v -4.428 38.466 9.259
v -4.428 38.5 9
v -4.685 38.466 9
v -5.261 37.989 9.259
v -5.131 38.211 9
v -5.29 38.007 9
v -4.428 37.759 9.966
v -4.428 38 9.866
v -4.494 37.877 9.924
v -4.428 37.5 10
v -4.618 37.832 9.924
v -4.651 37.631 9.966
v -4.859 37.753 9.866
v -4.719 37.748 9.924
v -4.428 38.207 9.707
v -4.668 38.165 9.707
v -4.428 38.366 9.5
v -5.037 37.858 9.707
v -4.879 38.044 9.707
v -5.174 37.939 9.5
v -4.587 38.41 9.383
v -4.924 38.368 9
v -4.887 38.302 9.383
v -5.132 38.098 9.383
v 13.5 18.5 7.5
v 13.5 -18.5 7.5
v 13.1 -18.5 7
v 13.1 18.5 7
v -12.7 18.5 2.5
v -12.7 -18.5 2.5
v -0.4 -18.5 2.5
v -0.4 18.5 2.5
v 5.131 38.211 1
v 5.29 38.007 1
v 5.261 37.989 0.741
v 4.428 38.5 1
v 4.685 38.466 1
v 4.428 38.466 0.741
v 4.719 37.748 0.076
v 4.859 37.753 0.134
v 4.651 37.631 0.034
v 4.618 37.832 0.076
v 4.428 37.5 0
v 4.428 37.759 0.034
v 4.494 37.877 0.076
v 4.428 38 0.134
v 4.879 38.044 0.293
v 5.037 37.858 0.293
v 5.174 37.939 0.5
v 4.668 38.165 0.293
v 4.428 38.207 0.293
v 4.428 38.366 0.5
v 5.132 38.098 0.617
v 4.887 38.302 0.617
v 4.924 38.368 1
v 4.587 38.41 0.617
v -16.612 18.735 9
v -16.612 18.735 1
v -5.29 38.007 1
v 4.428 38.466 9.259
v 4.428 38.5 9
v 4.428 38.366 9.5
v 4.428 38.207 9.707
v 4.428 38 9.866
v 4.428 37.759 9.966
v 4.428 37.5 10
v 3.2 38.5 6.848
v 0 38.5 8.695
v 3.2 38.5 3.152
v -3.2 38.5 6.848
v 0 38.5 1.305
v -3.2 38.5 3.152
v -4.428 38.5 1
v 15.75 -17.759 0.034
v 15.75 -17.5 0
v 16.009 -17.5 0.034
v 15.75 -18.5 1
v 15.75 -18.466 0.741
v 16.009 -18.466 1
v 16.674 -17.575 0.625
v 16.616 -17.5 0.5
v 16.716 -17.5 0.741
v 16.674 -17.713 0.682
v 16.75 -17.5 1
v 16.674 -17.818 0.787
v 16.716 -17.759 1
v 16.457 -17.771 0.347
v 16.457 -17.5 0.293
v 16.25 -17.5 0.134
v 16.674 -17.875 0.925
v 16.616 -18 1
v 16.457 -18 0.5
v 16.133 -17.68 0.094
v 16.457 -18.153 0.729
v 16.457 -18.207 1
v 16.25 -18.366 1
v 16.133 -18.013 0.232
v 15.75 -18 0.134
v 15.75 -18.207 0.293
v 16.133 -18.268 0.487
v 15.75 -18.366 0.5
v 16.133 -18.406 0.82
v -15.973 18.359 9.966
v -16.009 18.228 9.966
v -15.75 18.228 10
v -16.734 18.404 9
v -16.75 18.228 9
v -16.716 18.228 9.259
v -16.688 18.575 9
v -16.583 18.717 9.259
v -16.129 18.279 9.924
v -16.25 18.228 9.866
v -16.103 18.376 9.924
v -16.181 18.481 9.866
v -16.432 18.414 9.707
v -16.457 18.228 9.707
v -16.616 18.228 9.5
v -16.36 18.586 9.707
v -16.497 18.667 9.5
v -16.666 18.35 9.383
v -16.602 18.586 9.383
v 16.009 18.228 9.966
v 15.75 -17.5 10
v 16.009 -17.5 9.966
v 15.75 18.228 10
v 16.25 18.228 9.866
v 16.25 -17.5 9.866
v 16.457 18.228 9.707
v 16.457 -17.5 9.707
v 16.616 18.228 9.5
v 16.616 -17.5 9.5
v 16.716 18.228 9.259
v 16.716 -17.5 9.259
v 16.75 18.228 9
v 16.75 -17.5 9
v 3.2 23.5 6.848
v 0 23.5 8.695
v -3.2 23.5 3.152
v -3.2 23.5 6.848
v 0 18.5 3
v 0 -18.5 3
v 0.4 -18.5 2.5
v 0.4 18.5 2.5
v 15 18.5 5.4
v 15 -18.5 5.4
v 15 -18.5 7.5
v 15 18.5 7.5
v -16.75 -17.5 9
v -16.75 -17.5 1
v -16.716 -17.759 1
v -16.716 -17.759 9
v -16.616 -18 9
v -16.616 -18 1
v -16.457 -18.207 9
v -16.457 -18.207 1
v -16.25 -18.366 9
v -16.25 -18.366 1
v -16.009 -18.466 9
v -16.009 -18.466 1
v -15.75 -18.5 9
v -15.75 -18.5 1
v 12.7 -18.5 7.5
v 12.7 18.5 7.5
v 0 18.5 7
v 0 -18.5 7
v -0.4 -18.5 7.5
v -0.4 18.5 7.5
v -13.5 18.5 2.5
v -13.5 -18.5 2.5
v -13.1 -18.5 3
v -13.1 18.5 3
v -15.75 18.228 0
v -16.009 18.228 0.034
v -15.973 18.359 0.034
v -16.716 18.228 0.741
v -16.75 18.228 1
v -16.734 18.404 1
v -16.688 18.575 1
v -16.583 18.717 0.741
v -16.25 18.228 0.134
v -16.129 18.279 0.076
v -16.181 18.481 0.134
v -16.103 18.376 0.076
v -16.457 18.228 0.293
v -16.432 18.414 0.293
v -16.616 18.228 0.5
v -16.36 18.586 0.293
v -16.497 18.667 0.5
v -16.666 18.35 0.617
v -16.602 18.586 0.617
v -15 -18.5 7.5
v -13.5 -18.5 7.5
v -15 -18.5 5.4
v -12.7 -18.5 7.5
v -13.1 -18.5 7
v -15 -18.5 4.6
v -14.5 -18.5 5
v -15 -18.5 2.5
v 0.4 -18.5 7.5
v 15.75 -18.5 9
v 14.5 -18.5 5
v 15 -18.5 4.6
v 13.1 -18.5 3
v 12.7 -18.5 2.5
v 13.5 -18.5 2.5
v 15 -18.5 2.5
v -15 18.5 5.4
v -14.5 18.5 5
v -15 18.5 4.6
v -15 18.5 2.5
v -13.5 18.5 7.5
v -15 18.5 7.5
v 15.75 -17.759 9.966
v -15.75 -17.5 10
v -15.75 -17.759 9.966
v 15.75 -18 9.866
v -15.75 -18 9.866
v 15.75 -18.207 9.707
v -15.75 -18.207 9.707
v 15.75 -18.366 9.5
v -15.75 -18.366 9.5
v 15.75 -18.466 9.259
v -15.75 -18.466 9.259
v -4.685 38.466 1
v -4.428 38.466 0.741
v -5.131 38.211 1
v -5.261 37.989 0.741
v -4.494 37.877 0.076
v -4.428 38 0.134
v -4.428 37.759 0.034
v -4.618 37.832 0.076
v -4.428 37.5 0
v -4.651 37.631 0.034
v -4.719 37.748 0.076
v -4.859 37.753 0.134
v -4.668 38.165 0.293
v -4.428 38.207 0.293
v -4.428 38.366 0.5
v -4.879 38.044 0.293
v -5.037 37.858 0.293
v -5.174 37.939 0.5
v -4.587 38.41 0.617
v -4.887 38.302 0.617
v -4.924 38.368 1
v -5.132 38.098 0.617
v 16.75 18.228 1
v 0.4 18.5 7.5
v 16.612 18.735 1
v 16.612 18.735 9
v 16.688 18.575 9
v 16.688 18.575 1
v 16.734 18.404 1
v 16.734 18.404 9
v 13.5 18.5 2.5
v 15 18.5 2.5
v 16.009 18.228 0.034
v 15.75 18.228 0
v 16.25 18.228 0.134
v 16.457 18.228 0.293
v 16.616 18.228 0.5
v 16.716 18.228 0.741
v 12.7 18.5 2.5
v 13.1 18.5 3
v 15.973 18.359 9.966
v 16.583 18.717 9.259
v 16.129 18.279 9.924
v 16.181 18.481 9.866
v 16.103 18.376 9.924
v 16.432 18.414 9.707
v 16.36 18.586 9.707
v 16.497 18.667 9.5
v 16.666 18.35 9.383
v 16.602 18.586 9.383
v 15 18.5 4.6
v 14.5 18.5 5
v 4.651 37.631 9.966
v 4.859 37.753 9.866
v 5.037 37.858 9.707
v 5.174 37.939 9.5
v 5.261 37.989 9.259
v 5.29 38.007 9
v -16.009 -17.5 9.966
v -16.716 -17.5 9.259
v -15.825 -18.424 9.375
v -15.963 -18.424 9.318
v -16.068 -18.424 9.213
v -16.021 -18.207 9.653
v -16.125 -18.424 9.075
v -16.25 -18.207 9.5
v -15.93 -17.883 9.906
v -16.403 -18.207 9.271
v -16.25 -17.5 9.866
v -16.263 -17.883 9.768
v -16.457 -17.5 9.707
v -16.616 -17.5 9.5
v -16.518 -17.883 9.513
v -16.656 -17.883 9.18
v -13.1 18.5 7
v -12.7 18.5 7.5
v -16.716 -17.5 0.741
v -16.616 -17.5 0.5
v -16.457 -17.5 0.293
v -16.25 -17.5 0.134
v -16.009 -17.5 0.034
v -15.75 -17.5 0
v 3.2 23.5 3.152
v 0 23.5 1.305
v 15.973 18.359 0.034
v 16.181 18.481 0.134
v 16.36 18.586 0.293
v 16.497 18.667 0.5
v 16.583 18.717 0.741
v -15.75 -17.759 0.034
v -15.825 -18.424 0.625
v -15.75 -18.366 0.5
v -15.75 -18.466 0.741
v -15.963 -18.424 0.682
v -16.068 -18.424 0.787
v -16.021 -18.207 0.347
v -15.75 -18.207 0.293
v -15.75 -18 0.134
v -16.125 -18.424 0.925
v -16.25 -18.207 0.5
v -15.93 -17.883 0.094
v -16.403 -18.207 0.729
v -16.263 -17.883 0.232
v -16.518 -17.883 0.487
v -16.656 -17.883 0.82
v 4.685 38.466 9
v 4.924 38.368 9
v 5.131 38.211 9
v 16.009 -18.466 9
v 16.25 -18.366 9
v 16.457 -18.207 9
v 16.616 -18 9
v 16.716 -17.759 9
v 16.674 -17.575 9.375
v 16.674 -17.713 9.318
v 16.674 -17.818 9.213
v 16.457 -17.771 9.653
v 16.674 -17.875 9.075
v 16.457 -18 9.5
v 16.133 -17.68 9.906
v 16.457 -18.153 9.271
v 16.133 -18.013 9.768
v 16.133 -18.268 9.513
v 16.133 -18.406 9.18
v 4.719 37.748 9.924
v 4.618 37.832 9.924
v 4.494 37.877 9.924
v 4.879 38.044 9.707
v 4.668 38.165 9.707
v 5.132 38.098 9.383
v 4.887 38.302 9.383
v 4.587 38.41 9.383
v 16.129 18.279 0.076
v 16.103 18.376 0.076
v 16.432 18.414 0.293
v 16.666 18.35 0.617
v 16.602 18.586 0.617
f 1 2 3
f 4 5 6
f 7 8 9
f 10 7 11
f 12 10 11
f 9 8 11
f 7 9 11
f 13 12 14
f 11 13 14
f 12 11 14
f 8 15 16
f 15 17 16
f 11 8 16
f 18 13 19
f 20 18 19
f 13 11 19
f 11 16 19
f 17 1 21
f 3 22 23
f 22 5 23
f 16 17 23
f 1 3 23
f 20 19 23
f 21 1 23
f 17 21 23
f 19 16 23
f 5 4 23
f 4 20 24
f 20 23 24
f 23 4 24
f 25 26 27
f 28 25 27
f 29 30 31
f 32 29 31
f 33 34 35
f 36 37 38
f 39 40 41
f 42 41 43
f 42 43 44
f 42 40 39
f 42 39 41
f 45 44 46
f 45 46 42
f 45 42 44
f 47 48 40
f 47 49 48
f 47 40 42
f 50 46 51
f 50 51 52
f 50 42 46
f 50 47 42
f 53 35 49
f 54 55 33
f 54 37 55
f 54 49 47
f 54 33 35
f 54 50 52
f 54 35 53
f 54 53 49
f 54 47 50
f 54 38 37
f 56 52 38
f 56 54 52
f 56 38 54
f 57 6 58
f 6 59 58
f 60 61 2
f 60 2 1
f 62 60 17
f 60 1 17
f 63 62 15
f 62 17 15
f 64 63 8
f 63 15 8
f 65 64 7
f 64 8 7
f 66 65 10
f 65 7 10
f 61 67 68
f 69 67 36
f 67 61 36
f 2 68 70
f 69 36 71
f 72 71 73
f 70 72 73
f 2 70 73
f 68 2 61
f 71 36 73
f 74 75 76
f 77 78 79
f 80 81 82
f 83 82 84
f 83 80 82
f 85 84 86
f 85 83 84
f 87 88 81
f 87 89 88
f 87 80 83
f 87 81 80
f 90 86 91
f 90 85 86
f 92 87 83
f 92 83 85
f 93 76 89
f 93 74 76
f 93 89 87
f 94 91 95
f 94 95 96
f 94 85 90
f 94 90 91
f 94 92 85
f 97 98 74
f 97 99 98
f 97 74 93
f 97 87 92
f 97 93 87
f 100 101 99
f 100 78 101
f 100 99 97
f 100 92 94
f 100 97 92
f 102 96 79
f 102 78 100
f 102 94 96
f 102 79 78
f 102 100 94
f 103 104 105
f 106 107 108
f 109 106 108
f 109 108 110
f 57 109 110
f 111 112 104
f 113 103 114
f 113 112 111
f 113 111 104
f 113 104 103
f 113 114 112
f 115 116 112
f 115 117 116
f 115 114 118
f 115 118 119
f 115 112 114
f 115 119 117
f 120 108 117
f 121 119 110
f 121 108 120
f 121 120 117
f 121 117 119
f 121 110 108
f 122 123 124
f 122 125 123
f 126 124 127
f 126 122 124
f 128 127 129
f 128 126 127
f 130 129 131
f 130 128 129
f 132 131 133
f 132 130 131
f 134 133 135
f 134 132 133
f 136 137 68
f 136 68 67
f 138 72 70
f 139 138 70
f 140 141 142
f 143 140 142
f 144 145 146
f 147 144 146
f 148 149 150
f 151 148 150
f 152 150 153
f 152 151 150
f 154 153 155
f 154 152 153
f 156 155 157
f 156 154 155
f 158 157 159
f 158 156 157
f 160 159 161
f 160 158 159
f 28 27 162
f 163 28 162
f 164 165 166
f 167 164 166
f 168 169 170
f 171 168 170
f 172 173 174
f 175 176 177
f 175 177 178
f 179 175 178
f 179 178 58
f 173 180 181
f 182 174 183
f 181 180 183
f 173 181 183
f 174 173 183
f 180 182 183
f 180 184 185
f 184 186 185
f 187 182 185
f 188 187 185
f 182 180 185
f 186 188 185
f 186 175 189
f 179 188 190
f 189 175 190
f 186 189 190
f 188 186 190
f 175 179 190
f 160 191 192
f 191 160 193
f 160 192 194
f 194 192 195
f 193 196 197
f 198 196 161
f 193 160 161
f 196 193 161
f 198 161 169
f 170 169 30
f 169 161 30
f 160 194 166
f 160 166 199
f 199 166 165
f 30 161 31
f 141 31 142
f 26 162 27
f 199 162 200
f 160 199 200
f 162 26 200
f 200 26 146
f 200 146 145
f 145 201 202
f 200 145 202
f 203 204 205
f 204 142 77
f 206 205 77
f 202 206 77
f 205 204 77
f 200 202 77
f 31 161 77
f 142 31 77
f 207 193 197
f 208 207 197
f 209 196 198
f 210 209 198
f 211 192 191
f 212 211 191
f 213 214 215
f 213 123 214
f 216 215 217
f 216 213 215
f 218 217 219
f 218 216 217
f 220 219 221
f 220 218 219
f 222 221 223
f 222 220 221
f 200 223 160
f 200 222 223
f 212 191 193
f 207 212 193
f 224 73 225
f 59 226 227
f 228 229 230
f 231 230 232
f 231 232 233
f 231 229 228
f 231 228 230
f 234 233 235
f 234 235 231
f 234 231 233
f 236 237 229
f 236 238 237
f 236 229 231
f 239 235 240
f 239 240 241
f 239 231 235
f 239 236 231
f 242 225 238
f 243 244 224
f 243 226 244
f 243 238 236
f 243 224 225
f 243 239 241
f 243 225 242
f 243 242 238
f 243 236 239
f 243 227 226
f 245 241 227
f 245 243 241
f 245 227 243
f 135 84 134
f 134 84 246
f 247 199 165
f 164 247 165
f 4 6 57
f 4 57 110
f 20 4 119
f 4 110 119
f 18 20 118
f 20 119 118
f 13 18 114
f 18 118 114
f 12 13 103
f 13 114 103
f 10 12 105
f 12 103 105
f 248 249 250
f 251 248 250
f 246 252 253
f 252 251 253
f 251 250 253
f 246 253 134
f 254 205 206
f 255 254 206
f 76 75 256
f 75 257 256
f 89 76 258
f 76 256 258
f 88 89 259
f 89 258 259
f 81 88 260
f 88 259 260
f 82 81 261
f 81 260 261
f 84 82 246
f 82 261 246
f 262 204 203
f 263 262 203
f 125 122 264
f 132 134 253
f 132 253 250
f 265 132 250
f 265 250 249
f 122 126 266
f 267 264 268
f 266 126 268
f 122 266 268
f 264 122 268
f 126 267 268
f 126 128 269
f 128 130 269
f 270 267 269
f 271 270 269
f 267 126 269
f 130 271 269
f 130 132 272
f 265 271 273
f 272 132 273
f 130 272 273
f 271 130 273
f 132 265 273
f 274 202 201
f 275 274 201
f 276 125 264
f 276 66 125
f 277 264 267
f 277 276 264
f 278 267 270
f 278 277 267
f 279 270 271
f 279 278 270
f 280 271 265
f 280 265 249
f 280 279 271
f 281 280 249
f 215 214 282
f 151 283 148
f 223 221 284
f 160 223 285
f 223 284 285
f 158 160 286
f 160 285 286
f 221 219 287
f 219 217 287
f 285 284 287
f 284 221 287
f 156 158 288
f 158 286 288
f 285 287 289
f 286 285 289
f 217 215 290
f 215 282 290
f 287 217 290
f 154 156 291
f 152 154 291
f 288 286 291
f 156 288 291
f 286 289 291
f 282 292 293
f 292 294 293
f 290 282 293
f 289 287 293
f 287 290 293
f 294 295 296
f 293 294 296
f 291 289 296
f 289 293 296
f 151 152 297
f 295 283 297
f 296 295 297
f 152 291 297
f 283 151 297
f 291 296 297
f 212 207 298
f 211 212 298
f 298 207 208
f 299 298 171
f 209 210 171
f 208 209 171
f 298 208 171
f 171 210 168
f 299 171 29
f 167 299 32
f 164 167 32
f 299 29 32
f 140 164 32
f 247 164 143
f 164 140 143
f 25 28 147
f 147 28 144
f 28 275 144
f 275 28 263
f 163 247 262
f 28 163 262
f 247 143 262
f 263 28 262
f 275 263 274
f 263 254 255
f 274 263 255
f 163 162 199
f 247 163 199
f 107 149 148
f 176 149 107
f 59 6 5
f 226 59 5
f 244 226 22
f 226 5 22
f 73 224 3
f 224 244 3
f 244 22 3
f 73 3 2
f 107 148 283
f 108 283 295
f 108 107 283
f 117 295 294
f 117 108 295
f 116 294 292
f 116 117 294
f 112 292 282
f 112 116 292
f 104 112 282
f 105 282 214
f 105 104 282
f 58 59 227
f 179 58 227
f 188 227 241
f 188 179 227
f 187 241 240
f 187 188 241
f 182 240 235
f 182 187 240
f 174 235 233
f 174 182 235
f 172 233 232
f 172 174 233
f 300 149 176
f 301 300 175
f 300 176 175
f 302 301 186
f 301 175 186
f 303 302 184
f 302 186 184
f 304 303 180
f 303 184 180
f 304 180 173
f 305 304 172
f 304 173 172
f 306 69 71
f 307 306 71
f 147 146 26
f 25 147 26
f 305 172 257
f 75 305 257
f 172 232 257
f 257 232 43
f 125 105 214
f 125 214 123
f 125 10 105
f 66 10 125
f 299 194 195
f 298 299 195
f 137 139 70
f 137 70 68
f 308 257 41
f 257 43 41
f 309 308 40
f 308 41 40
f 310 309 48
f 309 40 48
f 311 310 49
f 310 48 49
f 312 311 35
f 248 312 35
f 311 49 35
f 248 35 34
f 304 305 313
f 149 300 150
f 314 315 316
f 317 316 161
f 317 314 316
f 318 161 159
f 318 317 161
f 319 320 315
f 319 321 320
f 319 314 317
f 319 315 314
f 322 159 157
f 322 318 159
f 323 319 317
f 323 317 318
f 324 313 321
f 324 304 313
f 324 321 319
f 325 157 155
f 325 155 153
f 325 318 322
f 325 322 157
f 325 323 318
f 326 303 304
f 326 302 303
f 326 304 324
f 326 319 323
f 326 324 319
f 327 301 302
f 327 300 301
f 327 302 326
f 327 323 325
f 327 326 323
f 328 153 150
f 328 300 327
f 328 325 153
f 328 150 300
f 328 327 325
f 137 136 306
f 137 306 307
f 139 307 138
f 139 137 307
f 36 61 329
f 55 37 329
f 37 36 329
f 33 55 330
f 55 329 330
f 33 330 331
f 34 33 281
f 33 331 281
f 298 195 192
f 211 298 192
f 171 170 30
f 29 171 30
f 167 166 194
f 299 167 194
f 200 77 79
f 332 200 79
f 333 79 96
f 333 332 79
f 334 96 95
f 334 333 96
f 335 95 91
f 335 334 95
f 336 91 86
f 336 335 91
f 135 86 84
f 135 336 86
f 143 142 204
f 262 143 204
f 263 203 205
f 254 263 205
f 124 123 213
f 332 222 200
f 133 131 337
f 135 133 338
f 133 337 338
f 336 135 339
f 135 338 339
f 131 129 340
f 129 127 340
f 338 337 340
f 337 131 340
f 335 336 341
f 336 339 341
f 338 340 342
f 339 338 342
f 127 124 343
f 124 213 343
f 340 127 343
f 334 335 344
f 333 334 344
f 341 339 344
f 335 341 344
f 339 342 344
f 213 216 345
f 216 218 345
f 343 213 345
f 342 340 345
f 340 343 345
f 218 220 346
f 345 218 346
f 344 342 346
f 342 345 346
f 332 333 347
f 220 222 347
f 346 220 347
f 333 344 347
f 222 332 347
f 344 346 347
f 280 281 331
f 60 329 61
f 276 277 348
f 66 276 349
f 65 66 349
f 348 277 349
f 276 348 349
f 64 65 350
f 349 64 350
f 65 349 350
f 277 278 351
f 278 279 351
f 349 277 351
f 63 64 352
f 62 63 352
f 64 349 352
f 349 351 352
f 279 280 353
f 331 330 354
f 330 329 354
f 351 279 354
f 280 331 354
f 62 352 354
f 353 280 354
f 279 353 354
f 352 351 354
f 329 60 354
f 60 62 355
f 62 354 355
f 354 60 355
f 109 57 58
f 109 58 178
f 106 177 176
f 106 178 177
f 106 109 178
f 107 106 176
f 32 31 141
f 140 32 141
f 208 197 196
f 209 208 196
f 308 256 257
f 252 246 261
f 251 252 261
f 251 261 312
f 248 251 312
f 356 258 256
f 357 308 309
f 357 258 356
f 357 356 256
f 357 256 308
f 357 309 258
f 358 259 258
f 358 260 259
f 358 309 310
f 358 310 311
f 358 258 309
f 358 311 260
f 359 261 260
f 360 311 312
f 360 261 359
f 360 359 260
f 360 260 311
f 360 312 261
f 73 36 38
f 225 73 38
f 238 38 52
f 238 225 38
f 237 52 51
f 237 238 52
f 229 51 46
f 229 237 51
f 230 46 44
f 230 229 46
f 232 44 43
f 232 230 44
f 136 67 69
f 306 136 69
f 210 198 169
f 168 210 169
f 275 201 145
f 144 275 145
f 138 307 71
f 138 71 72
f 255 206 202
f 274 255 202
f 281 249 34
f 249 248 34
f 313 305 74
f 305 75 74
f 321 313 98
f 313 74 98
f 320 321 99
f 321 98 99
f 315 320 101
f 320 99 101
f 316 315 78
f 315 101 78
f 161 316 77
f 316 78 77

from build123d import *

# Parameters (mm, degrees)
F0_W     = 33.5
F0_H     = 37
F1_DEPTH = 10
F3_DEPTH = 37
F4_DEPTH = 10
F6_DEPTH = 15
F7_R     = 1


with BuildPart() as f1:
    # F0 (on Top) → F1 (new body)
    with BuildSketch(Plane.XY):
        Rectangle(F0_W, F0_H)
    extrude(amount=F1_DEPTH)

    # F2 (on face) → F3 (cut, through all)
    with BuildSketch(Plane.XZ.offset(18.5)):
        Polygon((-13.5, 7.5), (-15, 7.5), (-15, 5.4), (-14.5, 5), (-15, 4.6), (-15, 2.5), (-13.5, 2.5), (-13.1, 3), (-12.7, 2.5), (-1.9, 2.5), (-0.4, 2.5), (0, 3), (0.4, 2.5), (11.2, 2.5), (12.7, 2.5), (13.1, 3), (13.5, 2.5), (15, 2.5), (15, 4.6), (14.5, 5), (15, 5.4), (15, 7.5), (13.5, 7.5), (13.1, 7), (12.7, 7.5), (0.4, 7.5), (0, 7), (-0.4, 7.5), (-12.7, 7.5), (-13.1, 7), align=None)
    extrude(amount=-F3_DEPTH, mode=Mode.SUBTRACT)

    # F0 (on Top) → F4 (join)
    with BuildSketch(Plane.XY):
        Polygon((-5, 38.5), (-16.75, 18.5), (16.75, 18.5), (5, 38.5), align=None)
    extrude(amount=F4_DEPTH)

    # F5 (on face) → F6 (cut)
    with BuildSketch(Plane(origin=(0, 38.5, 0), x_dir=(-1, 0, 0), z_dir=(0, 1, 0))):
        Polygon((-3.2, 6.8475208614), (-3.2, 3.1524791386), (0, 1.3049582772), (3.2, 3.1524791386), (3.2, 6.8475208614), (0, 8.6950417228), align=None)
    extrude(amount=-F6_DEPTH, mode=Mode.SUBTRACT)

    # F7
    f7_edges = [f1.edges().sort_by_distance(p)[0] for p in [
        (-16.75, 0, 10),
        (0, -18.5, 10),
        (16.75, 0, 10),
        (10.875, 28.5, 10),
        (0, 38.5, 10),
        (-10.875, 28.5, 10),
        (-16.75, 0, 0),
        (0, -18.5, 0),
        (16.75, 0, 0),
        (10.875, 28.5, 0),
        (0, 38.5, 0),
        (-10.875, 28.5, 0),
        (-16.75, 18.5, 5),
        (-16.75, -18.5, 5),
        (-5, 38.5, 5),
        (16.75, 18.5, 5),
        (5, 38.5, 5),
        (16.75, -18.5, 5),
    ]]
    fillet(f7_edges, radius=F7_R)


solid = f1.part
